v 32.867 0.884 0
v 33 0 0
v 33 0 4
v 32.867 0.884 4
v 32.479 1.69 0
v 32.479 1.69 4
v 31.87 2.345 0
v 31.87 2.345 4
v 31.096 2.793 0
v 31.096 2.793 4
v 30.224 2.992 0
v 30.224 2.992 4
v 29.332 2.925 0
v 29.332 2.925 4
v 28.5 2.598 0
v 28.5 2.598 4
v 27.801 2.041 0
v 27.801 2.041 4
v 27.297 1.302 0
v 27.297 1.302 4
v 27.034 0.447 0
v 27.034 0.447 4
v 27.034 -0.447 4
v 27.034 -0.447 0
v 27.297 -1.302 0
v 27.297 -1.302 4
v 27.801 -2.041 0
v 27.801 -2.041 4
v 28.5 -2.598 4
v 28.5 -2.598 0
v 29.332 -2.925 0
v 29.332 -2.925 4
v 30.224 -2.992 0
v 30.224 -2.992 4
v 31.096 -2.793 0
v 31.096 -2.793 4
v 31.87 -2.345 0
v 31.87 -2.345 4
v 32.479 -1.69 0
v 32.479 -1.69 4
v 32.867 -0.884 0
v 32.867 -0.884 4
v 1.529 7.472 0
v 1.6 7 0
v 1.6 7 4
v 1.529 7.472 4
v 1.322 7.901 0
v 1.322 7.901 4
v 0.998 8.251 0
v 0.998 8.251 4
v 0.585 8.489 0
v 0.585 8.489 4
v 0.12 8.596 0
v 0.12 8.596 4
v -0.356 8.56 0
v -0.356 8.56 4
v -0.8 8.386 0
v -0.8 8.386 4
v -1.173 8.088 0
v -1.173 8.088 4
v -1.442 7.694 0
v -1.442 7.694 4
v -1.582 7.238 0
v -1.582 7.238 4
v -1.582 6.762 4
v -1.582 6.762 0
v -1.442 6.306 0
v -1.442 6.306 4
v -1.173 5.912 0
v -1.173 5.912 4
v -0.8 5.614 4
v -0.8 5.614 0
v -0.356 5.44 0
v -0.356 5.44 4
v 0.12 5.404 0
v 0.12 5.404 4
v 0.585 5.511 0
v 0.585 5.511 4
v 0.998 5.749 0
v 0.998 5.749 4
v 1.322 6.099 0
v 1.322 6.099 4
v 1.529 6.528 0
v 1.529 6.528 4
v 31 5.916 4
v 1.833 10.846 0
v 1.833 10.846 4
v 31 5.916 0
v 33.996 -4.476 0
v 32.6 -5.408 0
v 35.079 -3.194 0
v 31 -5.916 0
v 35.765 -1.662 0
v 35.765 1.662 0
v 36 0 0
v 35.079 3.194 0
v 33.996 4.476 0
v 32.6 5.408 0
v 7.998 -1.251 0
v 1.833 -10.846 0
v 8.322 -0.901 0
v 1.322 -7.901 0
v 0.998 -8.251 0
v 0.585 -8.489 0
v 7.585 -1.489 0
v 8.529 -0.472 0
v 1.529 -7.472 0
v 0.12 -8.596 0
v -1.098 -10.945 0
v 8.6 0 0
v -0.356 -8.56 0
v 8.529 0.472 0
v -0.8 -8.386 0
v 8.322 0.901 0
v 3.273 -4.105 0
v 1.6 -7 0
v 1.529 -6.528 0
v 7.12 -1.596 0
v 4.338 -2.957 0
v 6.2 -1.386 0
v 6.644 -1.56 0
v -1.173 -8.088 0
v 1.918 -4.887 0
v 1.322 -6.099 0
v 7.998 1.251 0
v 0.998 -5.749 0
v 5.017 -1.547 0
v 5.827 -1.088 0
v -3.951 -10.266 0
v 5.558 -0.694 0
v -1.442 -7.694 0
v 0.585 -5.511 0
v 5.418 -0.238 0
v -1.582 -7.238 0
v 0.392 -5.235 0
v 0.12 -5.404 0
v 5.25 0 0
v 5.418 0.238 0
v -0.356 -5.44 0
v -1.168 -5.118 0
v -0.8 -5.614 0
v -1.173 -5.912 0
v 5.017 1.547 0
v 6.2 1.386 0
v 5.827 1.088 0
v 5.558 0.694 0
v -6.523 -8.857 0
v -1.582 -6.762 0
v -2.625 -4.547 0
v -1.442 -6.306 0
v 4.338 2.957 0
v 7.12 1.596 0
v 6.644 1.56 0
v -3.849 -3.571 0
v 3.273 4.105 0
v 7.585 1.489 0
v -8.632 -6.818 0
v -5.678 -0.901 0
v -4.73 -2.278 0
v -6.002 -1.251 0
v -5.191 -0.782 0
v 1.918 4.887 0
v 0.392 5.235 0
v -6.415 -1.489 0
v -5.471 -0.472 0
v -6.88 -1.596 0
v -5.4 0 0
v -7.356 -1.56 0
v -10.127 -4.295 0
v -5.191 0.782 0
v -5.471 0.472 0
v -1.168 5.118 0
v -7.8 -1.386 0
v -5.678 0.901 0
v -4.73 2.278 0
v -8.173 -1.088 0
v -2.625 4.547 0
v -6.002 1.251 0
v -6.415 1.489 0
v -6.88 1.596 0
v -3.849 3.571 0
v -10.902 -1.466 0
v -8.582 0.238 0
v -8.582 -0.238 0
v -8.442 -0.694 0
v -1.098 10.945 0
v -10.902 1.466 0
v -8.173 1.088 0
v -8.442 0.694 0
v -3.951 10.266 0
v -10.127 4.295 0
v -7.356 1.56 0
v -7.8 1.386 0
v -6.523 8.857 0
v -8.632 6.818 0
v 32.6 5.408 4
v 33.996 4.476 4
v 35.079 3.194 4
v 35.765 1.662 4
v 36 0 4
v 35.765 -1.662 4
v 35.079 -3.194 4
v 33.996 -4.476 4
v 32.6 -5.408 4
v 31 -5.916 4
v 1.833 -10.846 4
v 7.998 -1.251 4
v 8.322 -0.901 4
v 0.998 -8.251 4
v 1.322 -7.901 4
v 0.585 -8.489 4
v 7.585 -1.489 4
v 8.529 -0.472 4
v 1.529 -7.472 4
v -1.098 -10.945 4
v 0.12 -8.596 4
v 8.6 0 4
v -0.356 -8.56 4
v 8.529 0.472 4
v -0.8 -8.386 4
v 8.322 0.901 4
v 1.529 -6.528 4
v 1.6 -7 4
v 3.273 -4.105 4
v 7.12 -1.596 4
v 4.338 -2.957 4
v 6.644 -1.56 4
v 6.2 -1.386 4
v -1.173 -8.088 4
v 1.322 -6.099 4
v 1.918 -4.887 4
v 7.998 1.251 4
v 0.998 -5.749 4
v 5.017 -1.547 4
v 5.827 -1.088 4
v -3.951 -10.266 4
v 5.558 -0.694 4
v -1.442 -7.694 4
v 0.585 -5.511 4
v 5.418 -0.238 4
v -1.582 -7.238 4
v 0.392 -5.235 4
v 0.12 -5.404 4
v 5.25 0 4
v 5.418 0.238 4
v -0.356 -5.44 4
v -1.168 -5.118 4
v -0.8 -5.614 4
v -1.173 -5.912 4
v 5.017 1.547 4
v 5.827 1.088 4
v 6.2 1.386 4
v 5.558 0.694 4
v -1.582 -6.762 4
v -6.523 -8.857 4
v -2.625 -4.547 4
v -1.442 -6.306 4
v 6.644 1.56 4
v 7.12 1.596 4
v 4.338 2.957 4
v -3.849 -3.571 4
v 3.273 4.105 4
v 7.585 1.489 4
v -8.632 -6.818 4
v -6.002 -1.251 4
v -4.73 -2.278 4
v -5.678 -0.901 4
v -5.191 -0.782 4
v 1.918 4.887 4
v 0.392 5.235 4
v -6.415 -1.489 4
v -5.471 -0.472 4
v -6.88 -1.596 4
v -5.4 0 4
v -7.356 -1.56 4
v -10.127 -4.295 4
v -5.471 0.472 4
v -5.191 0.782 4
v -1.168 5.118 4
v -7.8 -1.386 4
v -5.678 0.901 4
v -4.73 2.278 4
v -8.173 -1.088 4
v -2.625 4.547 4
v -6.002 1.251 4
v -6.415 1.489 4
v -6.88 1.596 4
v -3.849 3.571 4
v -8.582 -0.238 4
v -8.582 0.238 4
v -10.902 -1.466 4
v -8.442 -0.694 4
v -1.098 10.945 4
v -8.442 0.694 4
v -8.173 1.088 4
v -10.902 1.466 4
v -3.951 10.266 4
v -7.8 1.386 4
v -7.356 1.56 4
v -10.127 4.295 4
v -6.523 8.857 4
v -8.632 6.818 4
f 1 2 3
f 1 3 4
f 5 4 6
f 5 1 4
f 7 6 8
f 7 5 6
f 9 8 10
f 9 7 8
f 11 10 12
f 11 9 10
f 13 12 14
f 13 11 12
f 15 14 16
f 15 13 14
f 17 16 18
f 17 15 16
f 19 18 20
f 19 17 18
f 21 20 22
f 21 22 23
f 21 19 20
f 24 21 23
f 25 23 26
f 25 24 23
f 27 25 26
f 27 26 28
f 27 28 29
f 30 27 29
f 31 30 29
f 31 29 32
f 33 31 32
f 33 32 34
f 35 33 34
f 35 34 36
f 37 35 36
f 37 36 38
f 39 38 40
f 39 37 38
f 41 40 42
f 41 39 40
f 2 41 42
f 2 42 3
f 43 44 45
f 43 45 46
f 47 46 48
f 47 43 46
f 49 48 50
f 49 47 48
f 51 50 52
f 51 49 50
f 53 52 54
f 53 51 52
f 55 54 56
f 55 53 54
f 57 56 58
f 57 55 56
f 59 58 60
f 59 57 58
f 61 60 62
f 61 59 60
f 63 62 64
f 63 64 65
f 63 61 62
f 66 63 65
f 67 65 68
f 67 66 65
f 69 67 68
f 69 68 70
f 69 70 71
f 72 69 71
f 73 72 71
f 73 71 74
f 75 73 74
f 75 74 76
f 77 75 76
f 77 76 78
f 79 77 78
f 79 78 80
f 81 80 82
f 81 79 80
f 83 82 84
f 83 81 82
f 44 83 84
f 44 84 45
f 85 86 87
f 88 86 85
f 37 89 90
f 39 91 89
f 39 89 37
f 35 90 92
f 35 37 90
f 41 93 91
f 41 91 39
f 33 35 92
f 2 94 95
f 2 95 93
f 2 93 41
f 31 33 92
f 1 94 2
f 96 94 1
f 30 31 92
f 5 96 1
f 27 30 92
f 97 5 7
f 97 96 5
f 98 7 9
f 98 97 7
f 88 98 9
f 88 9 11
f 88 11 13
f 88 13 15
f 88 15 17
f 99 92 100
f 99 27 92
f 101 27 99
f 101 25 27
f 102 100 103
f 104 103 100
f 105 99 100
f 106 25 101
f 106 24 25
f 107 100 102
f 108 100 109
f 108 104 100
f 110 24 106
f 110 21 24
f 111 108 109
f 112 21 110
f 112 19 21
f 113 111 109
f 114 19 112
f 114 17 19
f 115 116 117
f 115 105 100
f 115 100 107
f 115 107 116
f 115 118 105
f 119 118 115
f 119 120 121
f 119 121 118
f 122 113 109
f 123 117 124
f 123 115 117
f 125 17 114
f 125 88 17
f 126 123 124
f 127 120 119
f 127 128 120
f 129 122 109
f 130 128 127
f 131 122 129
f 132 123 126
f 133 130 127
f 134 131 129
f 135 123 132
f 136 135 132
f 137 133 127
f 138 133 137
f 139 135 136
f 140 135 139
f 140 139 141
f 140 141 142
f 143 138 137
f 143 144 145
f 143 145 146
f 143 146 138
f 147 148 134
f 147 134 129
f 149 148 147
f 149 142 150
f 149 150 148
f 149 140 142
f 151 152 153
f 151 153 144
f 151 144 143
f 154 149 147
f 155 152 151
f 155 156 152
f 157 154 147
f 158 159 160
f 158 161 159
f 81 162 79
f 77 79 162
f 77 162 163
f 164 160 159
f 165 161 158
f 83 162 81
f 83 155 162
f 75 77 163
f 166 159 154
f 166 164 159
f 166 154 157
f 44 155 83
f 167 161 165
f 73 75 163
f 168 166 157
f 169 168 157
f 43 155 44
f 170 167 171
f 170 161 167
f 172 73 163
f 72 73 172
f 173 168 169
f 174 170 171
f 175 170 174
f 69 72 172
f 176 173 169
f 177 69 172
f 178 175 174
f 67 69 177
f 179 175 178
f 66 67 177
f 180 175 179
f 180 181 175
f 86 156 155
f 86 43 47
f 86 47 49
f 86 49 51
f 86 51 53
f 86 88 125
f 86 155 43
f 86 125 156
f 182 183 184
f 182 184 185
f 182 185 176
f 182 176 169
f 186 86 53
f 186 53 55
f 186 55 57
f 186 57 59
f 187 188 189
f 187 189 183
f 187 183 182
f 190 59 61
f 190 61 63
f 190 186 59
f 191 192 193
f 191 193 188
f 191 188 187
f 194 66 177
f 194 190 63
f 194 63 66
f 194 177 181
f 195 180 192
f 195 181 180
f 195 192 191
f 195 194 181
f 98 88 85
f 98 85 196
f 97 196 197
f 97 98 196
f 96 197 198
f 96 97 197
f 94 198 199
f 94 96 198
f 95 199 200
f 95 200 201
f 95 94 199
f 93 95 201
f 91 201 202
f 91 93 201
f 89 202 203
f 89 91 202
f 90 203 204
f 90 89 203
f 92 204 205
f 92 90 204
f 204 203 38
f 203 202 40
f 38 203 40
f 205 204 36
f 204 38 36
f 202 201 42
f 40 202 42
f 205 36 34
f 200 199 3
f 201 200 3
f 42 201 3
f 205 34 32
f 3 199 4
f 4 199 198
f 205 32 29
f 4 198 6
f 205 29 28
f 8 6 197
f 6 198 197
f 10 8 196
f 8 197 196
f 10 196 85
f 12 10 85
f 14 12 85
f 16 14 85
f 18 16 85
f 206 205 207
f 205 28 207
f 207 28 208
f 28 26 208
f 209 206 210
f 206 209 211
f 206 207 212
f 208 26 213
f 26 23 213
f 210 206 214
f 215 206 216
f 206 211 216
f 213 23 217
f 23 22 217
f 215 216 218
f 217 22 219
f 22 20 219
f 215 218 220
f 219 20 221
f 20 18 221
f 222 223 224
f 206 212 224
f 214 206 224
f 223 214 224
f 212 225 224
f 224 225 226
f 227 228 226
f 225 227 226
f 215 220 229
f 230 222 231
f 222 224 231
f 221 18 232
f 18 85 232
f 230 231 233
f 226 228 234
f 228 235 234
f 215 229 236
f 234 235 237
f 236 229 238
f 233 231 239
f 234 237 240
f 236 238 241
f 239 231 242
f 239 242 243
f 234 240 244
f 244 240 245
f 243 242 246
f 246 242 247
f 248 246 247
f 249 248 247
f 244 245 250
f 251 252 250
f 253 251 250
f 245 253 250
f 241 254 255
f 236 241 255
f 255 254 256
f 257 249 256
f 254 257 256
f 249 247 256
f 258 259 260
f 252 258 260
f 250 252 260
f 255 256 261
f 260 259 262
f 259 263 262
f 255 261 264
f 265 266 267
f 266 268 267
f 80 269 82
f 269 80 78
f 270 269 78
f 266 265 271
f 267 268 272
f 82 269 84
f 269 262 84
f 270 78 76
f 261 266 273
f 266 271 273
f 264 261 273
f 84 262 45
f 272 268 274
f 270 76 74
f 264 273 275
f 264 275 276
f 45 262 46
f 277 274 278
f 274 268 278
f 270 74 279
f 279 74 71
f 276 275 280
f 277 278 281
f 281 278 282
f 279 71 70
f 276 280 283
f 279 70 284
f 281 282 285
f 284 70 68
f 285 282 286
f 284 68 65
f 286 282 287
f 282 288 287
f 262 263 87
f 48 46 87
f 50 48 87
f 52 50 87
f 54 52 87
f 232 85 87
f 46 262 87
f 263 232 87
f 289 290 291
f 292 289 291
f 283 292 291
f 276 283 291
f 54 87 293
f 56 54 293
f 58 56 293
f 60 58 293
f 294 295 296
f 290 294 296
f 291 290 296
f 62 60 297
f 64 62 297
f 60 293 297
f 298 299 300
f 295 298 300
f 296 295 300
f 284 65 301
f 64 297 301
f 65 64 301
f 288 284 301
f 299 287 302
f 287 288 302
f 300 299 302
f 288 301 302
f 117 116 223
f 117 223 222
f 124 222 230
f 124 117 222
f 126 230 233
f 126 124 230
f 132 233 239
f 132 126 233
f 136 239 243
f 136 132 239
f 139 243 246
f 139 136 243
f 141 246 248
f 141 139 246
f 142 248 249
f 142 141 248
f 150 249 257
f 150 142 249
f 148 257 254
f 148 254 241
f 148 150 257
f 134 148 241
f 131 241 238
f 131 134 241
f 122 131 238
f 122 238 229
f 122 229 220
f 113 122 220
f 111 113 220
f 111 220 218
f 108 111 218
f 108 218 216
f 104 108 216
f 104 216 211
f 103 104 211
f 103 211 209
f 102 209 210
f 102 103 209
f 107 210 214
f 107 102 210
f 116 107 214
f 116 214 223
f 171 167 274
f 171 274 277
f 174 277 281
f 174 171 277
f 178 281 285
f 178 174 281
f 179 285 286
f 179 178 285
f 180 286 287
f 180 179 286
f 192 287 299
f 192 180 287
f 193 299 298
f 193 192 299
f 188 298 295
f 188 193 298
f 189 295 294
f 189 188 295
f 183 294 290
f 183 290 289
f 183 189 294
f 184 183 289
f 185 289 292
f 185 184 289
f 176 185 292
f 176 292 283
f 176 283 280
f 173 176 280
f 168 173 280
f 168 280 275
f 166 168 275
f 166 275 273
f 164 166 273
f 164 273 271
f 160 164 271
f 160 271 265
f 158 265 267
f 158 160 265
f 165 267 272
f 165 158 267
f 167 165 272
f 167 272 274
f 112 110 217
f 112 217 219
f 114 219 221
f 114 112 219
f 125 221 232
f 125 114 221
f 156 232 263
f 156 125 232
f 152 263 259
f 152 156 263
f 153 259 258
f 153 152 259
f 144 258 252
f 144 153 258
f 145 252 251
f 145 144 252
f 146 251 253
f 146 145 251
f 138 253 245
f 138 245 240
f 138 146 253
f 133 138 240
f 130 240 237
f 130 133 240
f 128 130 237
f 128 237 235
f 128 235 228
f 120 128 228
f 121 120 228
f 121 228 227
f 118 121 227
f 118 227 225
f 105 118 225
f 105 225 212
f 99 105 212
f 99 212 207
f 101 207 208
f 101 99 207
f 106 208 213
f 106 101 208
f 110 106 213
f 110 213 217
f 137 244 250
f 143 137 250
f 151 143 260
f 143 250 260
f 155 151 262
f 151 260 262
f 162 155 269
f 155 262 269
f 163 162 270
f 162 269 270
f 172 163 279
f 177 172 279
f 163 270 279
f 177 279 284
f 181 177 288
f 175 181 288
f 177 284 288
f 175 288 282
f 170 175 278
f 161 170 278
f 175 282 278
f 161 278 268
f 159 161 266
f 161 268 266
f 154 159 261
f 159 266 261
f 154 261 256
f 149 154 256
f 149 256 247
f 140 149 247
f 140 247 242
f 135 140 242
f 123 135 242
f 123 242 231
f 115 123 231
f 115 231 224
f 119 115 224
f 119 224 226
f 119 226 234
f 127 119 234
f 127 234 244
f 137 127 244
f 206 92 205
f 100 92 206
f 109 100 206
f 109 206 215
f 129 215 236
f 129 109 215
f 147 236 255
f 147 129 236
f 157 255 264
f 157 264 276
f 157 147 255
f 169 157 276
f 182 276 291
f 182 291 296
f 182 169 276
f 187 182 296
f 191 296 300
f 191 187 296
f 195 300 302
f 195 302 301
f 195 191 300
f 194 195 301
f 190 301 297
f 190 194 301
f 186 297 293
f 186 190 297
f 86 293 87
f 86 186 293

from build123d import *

# Parameters (mm, degrees)
SKETCH_1_R          = 1.6
SKETCH_1_R_2        = 3
EXTRUDE_1_DEPTH     = 4
SKETCH_4_R          = 5.25
CUT_EXTRUDE_3_DEPTH = 38.854986461


with BuildPart() as part:
    # 草图1 → 凸台-拉伸1 (new body)
    with BuildSketch(Plane.XY):
        with BuildLine():
            Line((1.833333333, 10.846146269), (31, 5.916079783))
            ThreePointArc((31, 5.916079783), (36, 0), (31, -5.916079783))
            Line((31, -5.916079783), (1.833333333, -10.846146269))
            ThreePointArc((1.833333333, -10.846146269), (-11, 0), (1.833333333, 10.846146269))
        make_face()
        with Locations((0, 7)):
            Circle(SKETCH_1_R, mode=Mode.SUBTRACT)
        with Locations((-7, 0)):
            Circle(SKETCH_1_R, mode=Mode.SUBTRACT)
        with Locations((0, -7)):
            Circle(SKETCH_1_R, mode=Mode.SUBTRACT)
        with Locations((7, 0)):
            Circle(SKETCH_1_R, mode=Mode.SUBTRACT)
        with Locations((30, 0)):
            Circle(SKETCH_1_R_2, mode=Mode.SUBTRACT)
    extrude(amount=EXTRUDE_1_DEPTH)

    # 草图4 → 切除-拉伸3 (cut, through all)
    with BuildSketch(Plane.XY.offset(4)):
        Circle(SKETCH_4_R)
    extrude(amount=-CUT_EXTRUDE_3_DEPTH, mode=Mode.SUBTRACT)


solid = part.part
